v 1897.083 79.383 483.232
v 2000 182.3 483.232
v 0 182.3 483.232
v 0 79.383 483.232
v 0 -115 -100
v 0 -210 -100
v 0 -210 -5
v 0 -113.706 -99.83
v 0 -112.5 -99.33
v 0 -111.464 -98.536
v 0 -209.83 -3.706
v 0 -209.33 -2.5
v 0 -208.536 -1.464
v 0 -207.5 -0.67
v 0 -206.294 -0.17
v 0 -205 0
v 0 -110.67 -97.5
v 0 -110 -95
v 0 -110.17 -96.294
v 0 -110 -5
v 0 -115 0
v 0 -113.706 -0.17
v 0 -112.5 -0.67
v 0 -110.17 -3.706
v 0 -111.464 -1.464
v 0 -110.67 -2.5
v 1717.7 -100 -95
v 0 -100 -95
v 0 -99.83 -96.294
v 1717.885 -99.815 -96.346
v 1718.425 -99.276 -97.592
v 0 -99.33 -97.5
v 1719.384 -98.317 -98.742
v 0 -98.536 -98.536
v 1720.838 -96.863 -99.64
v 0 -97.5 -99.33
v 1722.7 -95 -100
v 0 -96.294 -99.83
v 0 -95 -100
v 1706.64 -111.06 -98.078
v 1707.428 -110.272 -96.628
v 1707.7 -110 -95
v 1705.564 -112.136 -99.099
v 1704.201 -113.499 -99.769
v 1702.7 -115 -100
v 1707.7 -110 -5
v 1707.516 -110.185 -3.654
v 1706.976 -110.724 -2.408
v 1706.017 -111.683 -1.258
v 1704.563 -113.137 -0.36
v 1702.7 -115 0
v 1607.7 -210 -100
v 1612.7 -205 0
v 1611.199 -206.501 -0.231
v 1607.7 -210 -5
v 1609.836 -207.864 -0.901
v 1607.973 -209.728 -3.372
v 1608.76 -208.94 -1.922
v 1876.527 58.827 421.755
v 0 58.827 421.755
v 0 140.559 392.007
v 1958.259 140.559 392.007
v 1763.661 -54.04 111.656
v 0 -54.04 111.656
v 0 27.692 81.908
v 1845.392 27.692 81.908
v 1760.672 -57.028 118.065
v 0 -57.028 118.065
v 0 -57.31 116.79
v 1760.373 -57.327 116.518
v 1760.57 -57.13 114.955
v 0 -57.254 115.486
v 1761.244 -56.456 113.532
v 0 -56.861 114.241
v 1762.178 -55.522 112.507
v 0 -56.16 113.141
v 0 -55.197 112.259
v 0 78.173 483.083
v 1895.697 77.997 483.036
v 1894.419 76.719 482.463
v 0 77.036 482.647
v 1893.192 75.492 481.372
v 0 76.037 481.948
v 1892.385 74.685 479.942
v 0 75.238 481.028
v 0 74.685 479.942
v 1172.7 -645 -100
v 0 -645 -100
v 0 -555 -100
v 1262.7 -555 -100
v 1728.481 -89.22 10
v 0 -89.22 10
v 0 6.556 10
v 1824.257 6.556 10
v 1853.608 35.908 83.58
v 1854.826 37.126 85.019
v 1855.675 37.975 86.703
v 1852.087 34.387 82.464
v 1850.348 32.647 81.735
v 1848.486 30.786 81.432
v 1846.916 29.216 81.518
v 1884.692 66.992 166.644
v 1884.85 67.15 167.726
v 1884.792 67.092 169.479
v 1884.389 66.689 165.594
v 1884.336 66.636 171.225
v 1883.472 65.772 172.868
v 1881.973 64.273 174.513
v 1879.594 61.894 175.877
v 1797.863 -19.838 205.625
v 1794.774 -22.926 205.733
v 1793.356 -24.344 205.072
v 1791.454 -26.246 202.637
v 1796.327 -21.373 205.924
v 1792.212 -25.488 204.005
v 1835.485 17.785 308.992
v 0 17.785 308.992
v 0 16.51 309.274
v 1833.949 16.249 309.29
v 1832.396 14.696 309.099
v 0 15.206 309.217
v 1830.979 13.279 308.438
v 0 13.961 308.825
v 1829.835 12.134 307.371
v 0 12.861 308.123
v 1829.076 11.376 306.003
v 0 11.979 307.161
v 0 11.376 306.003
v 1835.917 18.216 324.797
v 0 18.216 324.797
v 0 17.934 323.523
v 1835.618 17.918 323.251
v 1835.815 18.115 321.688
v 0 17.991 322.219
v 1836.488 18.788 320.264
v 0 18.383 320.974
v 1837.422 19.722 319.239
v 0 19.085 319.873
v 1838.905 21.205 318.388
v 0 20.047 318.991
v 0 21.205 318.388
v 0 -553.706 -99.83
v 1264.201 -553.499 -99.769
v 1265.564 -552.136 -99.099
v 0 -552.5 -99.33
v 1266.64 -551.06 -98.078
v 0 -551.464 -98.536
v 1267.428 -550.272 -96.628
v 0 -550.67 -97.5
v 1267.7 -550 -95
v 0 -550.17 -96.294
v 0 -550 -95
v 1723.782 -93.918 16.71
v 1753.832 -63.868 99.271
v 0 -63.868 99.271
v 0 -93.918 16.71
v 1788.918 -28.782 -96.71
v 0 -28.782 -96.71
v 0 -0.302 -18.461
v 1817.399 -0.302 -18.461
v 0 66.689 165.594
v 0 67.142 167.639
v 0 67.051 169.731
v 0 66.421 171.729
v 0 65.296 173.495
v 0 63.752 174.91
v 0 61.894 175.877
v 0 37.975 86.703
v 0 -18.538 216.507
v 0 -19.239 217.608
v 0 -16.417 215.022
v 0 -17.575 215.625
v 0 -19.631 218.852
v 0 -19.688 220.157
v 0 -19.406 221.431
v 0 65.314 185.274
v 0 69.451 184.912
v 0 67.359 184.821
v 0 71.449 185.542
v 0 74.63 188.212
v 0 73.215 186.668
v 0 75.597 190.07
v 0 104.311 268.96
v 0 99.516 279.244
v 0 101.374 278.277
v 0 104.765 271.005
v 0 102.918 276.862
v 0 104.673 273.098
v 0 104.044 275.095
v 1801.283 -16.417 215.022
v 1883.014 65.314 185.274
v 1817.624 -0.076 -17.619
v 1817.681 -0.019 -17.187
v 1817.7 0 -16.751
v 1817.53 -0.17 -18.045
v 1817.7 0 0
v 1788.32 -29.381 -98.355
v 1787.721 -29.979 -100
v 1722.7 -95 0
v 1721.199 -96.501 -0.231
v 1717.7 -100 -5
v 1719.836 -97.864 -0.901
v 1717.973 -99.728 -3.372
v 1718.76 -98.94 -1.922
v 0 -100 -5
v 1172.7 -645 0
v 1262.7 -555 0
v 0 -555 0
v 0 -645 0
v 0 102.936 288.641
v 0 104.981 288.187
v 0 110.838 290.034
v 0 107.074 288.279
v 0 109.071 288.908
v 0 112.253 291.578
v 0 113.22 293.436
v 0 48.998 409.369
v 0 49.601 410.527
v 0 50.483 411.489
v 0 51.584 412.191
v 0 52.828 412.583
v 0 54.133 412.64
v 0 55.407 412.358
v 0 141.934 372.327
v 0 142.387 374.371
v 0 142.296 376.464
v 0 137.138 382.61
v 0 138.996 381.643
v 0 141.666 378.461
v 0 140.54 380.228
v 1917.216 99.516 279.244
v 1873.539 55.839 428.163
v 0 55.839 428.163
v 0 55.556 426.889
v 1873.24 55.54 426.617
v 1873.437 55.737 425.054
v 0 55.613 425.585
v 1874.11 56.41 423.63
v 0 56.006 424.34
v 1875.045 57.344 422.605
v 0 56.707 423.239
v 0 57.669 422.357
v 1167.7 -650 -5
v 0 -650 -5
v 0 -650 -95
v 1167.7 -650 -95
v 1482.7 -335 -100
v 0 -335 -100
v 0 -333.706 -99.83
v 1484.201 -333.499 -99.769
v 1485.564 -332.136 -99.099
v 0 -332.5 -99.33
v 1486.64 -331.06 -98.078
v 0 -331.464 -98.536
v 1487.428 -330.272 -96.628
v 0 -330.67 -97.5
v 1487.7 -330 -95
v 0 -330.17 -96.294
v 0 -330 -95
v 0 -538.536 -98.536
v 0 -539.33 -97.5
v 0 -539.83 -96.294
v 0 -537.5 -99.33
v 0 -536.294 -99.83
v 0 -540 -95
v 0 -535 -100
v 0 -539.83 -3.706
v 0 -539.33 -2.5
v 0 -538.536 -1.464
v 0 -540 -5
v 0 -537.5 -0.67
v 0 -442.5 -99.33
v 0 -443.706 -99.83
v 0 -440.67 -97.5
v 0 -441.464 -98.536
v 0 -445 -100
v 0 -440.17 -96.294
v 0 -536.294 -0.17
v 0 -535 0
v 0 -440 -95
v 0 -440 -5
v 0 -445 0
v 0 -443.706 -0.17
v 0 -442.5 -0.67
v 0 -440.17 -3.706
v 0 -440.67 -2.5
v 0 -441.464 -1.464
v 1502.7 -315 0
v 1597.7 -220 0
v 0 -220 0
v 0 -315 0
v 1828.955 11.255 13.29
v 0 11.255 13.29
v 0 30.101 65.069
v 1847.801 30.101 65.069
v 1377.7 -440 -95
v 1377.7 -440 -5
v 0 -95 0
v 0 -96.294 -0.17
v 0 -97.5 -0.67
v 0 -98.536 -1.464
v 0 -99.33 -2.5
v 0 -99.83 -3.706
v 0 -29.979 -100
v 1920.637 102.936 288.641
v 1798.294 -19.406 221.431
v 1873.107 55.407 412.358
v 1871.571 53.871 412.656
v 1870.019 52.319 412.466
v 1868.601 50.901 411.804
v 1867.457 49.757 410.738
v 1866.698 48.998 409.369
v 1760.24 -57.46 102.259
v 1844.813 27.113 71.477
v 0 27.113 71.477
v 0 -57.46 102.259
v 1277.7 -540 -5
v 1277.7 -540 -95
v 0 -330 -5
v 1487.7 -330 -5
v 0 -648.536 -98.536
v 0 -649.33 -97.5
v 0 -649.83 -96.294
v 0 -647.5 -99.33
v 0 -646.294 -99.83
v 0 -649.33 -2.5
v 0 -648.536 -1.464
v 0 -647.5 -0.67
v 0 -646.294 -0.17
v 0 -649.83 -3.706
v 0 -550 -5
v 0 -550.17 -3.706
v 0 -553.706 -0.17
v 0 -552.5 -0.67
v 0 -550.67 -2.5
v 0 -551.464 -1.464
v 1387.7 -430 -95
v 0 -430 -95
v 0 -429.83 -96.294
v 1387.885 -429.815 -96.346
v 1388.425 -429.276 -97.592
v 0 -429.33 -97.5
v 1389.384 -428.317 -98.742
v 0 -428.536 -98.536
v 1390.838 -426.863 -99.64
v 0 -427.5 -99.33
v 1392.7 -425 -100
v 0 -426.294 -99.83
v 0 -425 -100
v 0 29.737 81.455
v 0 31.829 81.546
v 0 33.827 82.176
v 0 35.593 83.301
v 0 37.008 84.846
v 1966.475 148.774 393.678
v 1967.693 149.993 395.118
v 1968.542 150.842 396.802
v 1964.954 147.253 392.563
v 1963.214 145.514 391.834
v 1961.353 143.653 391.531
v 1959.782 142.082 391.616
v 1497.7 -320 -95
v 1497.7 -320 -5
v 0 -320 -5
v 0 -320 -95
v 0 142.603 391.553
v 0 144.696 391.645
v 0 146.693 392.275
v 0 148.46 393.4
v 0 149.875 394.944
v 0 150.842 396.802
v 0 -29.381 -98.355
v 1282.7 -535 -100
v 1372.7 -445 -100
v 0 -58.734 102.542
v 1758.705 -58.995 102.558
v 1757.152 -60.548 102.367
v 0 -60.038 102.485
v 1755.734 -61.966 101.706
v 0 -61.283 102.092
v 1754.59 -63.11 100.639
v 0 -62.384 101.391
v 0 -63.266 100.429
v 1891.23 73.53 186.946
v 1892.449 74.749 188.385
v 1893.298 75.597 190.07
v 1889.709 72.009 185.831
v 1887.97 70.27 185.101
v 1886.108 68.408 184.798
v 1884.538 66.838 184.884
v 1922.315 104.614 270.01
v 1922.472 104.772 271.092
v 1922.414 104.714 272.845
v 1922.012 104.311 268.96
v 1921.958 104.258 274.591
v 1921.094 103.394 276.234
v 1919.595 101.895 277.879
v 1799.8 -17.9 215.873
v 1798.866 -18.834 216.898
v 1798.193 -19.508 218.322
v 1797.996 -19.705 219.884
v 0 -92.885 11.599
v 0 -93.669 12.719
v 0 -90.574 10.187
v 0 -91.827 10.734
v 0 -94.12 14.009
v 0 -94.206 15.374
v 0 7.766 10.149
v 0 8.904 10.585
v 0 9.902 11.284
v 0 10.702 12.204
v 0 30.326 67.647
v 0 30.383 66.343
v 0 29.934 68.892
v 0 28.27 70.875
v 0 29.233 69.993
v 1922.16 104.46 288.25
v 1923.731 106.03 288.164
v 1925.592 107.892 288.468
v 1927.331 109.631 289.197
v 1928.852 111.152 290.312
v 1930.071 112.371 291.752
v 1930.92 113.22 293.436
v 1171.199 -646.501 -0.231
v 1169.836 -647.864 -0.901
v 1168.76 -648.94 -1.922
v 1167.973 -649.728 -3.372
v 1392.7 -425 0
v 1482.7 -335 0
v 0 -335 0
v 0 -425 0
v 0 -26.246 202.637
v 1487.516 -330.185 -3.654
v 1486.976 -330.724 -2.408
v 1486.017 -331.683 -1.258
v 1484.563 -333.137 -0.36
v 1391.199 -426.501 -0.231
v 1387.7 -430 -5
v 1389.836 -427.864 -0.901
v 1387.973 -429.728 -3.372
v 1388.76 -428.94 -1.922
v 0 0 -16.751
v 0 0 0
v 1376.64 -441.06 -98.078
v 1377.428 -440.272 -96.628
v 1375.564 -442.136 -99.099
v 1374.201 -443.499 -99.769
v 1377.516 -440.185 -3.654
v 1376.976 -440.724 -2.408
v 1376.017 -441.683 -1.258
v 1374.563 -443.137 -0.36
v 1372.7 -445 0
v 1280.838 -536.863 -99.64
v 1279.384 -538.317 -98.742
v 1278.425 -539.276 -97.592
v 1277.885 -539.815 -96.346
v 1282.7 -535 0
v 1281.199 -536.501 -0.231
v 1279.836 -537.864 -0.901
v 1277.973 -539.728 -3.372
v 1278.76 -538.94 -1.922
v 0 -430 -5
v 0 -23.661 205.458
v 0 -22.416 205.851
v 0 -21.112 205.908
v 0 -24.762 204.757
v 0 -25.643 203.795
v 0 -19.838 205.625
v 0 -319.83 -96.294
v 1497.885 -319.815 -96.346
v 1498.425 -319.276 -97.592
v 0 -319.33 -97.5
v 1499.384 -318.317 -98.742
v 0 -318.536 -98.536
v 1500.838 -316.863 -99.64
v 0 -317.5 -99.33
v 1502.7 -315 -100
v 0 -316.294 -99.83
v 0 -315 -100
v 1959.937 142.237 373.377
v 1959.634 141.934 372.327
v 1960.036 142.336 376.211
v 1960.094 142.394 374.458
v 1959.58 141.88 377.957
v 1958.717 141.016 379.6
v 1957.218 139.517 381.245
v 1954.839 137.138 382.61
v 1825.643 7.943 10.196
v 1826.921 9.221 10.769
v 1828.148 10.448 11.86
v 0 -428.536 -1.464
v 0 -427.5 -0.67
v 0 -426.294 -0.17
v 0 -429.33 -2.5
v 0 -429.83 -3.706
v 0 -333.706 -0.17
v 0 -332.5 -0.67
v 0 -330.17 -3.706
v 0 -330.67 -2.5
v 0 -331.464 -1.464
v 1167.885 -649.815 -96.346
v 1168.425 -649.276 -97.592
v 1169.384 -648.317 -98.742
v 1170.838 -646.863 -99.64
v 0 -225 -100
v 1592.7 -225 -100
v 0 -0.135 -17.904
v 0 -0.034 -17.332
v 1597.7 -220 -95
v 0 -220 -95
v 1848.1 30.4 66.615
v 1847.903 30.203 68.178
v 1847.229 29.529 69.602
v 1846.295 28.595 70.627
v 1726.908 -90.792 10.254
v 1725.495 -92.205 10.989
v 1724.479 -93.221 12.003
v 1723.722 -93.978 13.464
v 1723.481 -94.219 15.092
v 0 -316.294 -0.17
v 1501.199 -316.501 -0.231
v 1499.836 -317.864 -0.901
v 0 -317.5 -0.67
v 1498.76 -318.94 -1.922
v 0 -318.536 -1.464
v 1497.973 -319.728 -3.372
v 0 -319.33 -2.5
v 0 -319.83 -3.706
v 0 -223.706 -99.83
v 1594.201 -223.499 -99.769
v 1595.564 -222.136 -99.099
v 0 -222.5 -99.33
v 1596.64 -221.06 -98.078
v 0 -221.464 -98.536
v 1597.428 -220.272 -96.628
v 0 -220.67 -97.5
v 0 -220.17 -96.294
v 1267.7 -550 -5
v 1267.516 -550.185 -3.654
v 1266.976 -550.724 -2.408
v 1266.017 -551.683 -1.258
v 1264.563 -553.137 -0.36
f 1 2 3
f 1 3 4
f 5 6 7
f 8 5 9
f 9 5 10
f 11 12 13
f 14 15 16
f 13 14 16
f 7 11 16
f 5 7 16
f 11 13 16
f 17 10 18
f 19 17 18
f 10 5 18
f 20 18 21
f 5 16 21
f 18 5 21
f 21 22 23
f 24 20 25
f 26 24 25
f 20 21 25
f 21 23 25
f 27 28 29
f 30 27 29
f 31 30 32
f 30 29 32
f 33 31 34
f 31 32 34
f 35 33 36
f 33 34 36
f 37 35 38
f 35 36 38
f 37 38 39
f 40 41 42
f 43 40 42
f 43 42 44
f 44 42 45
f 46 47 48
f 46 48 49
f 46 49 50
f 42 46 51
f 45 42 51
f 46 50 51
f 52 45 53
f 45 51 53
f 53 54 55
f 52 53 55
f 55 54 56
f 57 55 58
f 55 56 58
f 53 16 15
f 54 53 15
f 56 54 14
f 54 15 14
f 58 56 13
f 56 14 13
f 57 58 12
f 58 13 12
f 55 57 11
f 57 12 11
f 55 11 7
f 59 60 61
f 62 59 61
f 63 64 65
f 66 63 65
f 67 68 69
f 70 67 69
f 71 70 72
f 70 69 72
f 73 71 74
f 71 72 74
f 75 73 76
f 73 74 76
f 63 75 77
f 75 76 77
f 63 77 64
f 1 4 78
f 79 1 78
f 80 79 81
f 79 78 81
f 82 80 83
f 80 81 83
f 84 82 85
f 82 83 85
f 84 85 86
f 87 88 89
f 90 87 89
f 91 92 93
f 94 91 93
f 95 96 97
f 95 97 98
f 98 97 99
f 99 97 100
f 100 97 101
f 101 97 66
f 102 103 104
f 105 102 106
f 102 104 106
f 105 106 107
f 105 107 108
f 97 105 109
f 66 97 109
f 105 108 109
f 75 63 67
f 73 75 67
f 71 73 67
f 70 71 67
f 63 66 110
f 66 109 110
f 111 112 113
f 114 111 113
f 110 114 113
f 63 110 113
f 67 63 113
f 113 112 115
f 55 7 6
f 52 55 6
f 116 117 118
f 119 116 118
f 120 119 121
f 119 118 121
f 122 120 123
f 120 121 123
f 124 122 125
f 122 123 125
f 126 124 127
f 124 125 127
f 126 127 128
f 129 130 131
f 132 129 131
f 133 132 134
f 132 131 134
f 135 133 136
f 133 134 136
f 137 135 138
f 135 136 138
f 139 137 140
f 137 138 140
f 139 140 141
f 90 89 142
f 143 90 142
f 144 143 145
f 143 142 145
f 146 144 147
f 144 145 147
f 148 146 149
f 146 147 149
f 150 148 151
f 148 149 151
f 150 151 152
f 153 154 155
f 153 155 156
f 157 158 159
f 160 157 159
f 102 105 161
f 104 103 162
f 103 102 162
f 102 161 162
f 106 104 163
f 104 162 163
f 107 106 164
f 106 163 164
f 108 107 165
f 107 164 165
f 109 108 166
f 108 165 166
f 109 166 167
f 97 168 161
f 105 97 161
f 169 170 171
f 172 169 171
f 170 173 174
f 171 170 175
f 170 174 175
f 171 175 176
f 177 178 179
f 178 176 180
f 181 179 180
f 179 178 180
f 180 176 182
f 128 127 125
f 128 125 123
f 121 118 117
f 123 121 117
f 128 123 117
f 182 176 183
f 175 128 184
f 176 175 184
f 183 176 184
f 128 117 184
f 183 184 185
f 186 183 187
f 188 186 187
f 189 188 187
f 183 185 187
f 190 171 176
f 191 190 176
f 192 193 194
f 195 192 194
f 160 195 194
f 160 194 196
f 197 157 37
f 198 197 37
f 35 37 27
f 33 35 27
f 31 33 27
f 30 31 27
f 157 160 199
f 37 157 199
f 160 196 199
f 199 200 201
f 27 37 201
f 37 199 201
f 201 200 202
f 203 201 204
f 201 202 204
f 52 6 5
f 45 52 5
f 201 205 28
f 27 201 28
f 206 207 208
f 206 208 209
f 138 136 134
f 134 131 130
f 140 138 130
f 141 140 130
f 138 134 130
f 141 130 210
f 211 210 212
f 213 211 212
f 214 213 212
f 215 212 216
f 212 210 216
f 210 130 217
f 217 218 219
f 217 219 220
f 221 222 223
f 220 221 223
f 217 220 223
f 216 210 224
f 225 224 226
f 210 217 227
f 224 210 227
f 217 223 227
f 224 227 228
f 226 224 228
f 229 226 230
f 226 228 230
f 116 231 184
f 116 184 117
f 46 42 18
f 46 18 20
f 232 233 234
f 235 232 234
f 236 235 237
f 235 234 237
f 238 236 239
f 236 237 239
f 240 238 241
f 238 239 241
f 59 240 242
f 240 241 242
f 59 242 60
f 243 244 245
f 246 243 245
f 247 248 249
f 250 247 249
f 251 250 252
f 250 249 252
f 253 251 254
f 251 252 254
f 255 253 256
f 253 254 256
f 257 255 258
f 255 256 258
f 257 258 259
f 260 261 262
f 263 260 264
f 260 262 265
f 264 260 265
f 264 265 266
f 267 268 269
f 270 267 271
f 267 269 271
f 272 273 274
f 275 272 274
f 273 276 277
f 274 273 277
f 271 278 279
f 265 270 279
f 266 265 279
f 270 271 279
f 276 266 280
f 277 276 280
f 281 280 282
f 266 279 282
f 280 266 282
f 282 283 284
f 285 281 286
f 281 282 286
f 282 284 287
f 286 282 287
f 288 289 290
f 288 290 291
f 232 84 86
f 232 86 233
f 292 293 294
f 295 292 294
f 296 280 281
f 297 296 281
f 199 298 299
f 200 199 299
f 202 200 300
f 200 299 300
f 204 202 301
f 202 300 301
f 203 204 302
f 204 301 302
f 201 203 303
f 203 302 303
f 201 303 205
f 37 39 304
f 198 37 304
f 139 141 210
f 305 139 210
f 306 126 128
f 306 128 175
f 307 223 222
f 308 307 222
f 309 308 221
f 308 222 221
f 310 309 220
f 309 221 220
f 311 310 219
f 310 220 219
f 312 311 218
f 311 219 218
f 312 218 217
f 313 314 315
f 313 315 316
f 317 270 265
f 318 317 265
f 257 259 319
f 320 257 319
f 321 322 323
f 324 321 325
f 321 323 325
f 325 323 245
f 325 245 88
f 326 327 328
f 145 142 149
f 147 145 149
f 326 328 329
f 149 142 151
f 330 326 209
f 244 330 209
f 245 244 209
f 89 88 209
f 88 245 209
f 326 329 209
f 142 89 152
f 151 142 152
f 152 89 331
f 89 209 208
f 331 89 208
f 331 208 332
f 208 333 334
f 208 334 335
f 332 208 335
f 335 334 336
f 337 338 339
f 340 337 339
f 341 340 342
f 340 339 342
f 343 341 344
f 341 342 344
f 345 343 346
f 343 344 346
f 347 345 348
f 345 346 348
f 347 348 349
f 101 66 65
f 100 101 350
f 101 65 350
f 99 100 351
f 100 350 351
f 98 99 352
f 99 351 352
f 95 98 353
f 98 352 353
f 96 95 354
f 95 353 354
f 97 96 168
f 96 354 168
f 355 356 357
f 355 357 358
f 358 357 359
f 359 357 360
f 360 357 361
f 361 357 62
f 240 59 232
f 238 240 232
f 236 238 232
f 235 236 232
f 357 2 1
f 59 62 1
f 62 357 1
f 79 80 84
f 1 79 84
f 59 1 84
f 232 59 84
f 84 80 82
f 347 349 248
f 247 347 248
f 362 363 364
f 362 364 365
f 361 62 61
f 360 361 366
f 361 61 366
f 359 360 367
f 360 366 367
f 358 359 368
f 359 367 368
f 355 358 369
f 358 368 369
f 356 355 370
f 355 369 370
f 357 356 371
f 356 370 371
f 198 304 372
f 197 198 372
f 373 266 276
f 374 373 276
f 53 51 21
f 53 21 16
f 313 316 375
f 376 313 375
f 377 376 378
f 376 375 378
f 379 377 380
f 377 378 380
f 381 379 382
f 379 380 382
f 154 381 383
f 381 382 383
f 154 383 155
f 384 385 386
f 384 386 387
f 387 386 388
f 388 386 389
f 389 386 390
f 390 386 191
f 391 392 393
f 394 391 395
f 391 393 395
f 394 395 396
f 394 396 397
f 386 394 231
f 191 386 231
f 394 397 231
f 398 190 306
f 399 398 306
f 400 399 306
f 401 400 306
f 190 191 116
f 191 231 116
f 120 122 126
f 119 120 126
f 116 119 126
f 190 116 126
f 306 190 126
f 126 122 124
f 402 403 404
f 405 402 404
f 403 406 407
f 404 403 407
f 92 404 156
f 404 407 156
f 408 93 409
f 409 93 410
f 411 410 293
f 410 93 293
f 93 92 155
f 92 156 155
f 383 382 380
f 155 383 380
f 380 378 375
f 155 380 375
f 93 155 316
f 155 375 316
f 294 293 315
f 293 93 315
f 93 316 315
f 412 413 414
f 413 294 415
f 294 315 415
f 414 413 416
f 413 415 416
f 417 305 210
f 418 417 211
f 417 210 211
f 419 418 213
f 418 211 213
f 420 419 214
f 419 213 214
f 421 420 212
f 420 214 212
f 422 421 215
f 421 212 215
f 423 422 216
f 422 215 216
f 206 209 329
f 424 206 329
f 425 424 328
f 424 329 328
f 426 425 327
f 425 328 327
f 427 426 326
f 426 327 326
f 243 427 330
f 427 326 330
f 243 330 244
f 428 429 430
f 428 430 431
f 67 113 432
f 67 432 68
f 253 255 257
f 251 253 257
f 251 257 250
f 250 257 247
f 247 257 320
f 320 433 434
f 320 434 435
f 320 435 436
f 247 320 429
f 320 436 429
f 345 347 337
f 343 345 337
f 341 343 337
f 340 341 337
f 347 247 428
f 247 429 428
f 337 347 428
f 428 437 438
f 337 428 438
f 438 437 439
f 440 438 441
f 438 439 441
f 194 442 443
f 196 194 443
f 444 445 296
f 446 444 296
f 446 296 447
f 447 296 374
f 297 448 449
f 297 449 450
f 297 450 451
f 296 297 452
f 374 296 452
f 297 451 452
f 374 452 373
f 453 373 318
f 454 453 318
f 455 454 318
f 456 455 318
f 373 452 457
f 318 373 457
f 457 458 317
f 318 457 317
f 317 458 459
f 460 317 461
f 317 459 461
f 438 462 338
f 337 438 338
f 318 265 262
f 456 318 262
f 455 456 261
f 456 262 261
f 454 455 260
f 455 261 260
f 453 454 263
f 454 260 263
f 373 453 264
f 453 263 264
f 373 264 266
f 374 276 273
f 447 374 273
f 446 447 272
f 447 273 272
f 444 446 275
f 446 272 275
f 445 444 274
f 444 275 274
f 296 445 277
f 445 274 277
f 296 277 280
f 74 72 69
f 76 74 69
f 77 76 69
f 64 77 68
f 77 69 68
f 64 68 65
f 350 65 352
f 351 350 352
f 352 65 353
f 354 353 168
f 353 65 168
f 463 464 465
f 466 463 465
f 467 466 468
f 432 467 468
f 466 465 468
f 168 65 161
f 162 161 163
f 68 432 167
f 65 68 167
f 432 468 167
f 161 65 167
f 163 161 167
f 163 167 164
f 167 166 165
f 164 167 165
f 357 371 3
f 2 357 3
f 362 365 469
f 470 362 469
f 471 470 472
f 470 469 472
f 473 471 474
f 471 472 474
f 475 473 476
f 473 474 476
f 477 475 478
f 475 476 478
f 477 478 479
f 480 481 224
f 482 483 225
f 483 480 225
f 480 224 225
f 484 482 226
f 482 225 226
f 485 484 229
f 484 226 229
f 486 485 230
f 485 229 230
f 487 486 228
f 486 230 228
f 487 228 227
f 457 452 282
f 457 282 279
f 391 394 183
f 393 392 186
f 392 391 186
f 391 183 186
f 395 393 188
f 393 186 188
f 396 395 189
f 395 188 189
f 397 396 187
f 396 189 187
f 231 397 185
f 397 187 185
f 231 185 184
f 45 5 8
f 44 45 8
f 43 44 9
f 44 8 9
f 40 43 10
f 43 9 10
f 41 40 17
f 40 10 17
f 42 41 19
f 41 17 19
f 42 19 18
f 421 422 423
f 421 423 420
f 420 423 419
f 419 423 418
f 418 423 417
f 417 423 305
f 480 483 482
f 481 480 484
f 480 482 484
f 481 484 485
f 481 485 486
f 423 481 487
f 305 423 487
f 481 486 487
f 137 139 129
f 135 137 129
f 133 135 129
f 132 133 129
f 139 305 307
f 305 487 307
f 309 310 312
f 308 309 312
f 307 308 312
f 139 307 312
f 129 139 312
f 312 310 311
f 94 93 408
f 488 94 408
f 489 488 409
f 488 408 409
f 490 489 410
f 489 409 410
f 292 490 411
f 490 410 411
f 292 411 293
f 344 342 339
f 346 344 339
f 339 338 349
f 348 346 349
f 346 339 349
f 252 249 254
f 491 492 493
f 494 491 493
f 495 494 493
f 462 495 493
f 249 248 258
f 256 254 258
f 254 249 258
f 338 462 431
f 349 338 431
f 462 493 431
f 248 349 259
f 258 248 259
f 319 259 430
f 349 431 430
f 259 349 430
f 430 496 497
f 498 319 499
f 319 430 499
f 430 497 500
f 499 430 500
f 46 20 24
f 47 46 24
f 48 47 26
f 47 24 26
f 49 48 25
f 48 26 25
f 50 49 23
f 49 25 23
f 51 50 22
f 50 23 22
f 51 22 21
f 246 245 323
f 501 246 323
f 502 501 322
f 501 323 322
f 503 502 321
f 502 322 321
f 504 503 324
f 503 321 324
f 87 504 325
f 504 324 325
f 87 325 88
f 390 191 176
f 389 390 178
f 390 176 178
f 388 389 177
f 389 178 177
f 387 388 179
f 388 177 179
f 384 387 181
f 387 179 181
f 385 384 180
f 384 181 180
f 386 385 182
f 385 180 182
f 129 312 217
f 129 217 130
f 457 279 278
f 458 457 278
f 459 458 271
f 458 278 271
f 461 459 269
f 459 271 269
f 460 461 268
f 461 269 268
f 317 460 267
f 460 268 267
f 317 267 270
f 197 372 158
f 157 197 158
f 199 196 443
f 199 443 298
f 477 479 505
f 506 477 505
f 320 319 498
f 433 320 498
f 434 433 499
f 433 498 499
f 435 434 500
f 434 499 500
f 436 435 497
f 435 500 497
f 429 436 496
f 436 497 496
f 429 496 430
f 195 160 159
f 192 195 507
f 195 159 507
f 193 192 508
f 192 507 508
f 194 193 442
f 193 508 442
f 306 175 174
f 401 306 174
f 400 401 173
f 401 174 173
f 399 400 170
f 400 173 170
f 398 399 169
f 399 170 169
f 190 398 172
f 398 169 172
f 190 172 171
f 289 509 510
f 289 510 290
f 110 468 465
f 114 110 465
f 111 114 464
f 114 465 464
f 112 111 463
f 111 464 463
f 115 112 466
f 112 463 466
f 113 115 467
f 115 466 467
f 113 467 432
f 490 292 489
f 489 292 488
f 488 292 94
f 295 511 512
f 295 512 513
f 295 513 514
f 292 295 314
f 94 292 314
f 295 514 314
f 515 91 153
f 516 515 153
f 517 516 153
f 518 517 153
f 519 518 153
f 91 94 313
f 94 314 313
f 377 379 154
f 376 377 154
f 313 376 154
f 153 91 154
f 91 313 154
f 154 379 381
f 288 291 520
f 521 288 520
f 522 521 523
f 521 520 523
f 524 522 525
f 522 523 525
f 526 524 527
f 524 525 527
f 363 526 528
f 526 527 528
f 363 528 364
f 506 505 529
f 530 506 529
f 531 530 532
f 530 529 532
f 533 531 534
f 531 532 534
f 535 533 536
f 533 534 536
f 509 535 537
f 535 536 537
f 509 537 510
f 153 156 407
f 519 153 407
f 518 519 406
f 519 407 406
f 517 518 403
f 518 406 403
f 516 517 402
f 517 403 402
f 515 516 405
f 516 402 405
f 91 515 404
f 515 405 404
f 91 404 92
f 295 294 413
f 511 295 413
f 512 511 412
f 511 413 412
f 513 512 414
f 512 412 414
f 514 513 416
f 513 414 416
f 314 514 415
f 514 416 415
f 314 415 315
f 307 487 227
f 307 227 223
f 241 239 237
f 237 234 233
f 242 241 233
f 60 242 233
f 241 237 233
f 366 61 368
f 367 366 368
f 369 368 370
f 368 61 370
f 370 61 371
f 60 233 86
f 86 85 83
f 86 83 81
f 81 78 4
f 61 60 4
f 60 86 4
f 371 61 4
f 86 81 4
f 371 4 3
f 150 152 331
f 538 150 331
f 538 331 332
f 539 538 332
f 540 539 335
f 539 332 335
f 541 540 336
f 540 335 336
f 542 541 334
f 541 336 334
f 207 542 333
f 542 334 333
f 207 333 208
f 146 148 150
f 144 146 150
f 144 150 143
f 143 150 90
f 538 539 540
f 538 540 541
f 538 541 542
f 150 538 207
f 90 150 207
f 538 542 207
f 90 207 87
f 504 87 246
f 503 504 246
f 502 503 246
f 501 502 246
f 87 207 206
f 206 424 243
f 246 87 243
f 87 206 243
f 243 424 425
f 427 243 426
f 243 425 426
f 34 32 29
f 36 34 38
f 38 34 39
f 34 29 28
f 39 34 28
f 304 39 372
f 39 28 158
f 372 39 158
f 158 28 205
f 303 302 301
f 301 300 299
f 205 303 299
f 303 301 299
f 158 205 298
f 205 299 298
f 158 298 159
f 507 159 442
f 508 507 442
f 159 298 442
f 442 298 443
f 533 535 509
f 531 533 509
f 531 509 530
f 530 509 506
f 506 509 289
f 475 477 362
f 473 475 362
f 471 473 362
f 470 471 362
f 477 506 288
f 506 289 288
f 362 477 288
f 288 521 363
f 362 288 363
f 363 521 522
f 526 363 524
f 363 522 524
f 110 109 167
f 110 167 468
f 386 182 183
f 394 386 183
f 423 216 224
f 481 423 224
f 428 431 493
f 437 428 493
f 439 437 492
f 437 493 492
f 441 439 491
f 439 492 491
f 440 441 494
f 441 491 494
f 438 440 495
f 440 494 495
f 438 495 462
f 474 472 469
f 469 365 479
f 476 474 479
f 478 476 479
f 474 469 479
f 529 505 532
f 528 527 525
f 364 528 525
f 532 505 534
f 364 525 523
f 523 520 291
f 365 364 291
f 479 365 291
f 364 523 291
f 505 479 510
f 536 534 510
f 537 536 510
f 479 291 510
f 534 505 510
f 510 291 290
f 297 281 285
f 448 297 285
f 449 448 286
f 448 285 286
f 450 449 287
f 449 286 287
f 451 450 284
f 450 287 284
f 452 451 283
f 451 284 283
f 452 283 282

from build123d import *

# Parameters (mm, degrees)
F1_DEPTH = 2000
F3_DEPTH = 583.2330008918


with BuildPart() as f1:
    # F0 (on Right) → F1 (new body)
    with BuildSketch(Plane.YZ):
        with BuildLine():
            Line((0, -16.7510631673), (0, 0))
            Line((0, 0), (-95, 0))
            ThreePointArc((-95, 0), (-98.5355339059, -1.4644660941), (-100, -5))
            Line((-100, -5), (-100, -95))
            ThreePointArc((-100, -95), (-98.5355339059, -98.5355339059), (-95, -100))
            Line((-95, -100), (-33.4802838701, -100))
            Line((-33.4802838701, -100), (-29.979246179, -100))
            Line((-29.979246179, -100), (-29.3805334726, -98.3550503583))
            Line((-29.3805334726, -98.3550503583), (-28.7818207661, -96.7101007166))
            Line((-28.7818207661, -96.7101007166), (-0.3015368961, -18.4611638839))
            ThreePointArc((-0.3015368961, -18.4611638839), (-0.0759612349, -17.6193040556), (0, -16.7510631673))
        make_face()
    extrude(amount=F1_DEPTH)


with BuildPart() as f1b:
    # F0 (on Right) → F1, piece 2 (new body)
    with BuildSketch(Plane.YZ):
        with BuildLine():
            ThreePointArc((-110, -5), (-111.4644660941, -1.4644660941), (-115, 0))
            Line((-115, 0), (-205, 0))
            ThreePointArc((-205, 0), (-208.5355339059, -1.4644660941), (-210, -5))
            Line((-210, -5), (-210, -100))
            Line((-210, -100), (-115, -100))
            ThreePointArc((-115, -100), (-111.4644660941, -98.5355339059), (-110, -95))
            Line((-110, -95), (-110, -5))
        make_face()
    extrude(amount=F1_DEPTH)


with BuildPart() as f1c:
    # F0 (on Right) → F1, piece 3 (new body)
    with BuildSketch(Plane.YZ):
        with BuildLine():
            Line((-220, -95), (-220, 0))
            Line((-220, 0), (-315, 0))
            ThreePointArc((-315, 0), (-318.5355339059, -1.4644660941), (-320, -5))
            Line((-320, -5), (-320, -95))
            ThreePointArc((-320, -95), (-318.5355339059, -98.5355339059), (-315, -100))
            Line((-315, -100), (-225, -100))
            ThreePointArc((-225, -100), (-221.4644660941, -98.5355339059), (-220, -95))
        make_face()
    extrude(amount=F1_DEPTH)


with BuildPart() as f1d:
    # F0 (on Right) → F1, piece 4 (new body)
    with BuildSketch(Plane.YZ):
        with BuildLine():
            ThreePointArc((-330, -5), (-331.4644660941, -1.4644660941), (-335, 0))
            Line((-335, 0), (-425, 0))
            ThreePointArc((-425, 0), (-428.5355339059, -1.4644660941), (-430, -5))
            Line((-430, -5), (-430, -95))
            ThreePointArc((-430, -95), (-428.5355339059, -98.5355339059), (-425, -100))
            Line((-425, -100), (-335, -100))
            ThreePointArc((-335, -100), (-331.4644660941, -98.5355339059), (-330, -95))
            Line((-330, -95), (-330, -5))
        make_face()
    extrude(amount=F1_DEPTH)


with BuildPart() as f1e:
    # F0 (on Right) → F1, piece 5 (new body)
    with BuildSketch(Plane.YZ):
        with BuildLine():
            ThreePointArc((-440, -5), (-441.4644660941, -1.4644660941), (-445, 0))
            Line((-445, 0), (-535, 0))
            ThreePointArc((-535, 0), (-538.5355339059, -1.4644660941), (-540, -5))
            Line((-540, -5), (-540, -95))
            ThreePointArc((-540, -95), (-538.5355339059, -98.5355339059), (-535, -100))
            Line((-535, -100), (-445, -100))
            ThreePointArc((-445, -100), (-441.4644660941, -98.5355339059), (-440, -95))
            Line((-440, -95), (-440, -5))
        make_face()
    extrude(amount=F1_DEPTH)


with BuildPart() as f1f:
    # F0 (on Right) → F1, piece 6 (new body)
    with BuildSketch(Plane.YZ):
        with BuildLine():
            ThreePointArc((-550, -5), (-551.4644660941, -1.4644660941), (-555, 0))
            Line((-555, 0), (-645, 0))
            ThreePointArc((-645, 0), (-648.5355339059, -1.4644660941), (-650, -5))
            Line((-650, -5), (-650, -95))
            ThreePointArc((-650, -95), (-648.5355339059, -98.5355339059), (-645, -100))
            Line((-645, -100), (-555, -100))
            ThreePointArc((-555, -100), (-551.4644660941, -98.5355339059), (-550, -95))
            Line((-550, -95), (-550, -5))
        make_face()
    extrude(amount=F1_DEPTH)


with BuildPart() as f1g:
    # F0 (on Right) → F1, piece 7 (new body)
    with BuildSketch(Plane.YZ):
        with BuildLine():
            Line((-63.8683840414, 99.2707989747), (-93.9180207276, 16.7101007166))
            ThreePointArc((-93.9180207276, 16.7101007166), (-93.3153178451, 12.1321178182), (-89.2195576236, 10))
            Line((-89.2195576236, 10), (6.5564418992, 10))
            ThreePointArc((6.5564418992, 10), (9.424324081, 10.9042397786), (11.2549050031, 13.2898992834))
            Line((11.2549050031, 13.2898992834), (30.1008780372, 65.0687846421))
            ThreePointArc((30.1008780372, 65.0687846421), (29.9339538684, 68.8919766674), (27.1125156499, 71.4773484627))
            Line((27.1125156499, 71.4773484627), (-57.4598202208, 102.259161362))
            ThreePointArc((-57.4598202208, 102.259161362), (-61.2830122462, 102.0922371932), (-63.8683840414, 99.2707989747))
        make_face()
    extrude(amount=F1_DEPTH)


with BuildPart() as f1h:
    # F0 (on Right) → F1, piece 8 (new body)
    with BuildSketch(Plane.YZ):
        with BuildLine():
            ThreePointArc((-57.0279811749, 118.0646513904), (-56.8610570061, 114.241459365), (-54.0396187876, 111.6560875698))
            Line((-54.0396187876, 111.6560875698), (27.6920079995, 81.9082082212))
            ThreePointArc((27.6920079995, 81.9082082212), (33.8267168069, 82.1760553922), (37.9752144544, 86.7033461415))
            Line((37.9752144544, 86.7033461415), (66.6891602523, 165.5942638449))
            ThreePointArc((66.6891602523, 165.5942638449), (66.4213130813, 171.7289726523), (61.894022332, 175.8774702998))
            Line((61.894022332, 175.8774702998), (-19.837604455, 205.6253496484))
            ThreePointArc((-19.837604455, 205.6253496484), (-23.6607964803, 205.4584254797), (-26.2461682756, 202.6369872611))
            Line((-26.2461682756, 202.6369872611), (-57.0279811749, 118.0646513904))
        make_face()
    extrude(amount=F1_DEPTH)


with BuildPart() as f1i:
    # F0 (on Right) → F1, piece 9 (new body)
    with BuildSketch(Plane.YZ):
        with BuildLine():
            Line((11.3760474902, 306.0031755476), (-19.4057654091, 221.4308396768))
            ThreePointArc((-19.4057654091, 221.4308396768), (-19.2388412403, 217.6076476515), (-16.4174030218, 215.0222758563))
            Line((-16.4174030218, 215.0222758563), (65.3142237653, 185.2743965076))
            ThreePointArc((65.3142237653, 185.2743965076), (71.4489325728, 185.5422436786), (75.5974302202, 190.0695344279))
            Line((75.5974302202, 190.0695344279), (104.3113760182, 268.9604521313))
            ThreePointArc((104.3113760182, 268.9604521313), (104.0435288472, 275.0951609388), (99.5162380979, 279.2436585862))
            Line((99.5162380979, 279.2436585862), (17.7846113108, 308.9915379349))
            ThreePointArc((17.7846113108, 308.9915379349), (13.9614192855, 308.8246137661), (11.3760474902, 306.0031755476))
        make_face()
    extrude(amount=F1_DEPTH)


with BuildPart() as f1j:
    # F0 (on Right) → F1, piece 10 (new body)
    with BuildSketch(Plane.YZ):
        with BuildLine():
            Line((150.8418617518, 396.8019110008), (182.2998418171, 483.2320008918))
            Line((182.2998418171, 483.2320008918), (79.3831022606, 483.2320008918))
            ThreePointArc((79.3831022606, 483.2320008918), (76.5152200788, 482.3277611133), (74.6846391566, 479.9421016085))
            Line((74.6846391566, 479.9421016085), (55.8386661226, 428.1632162497))
            ThreePointArc((55.8386661226, 428.1632162497), (56.0055902913, 424.3400242244), (58.8270285099, 421.7546524292))
            Line((58.8270285099, 421.7546524292), (140.5586552969, 392.0067730805))
            ThreePointArc((140.5586552969, 392.0067730805), (146.6933641044, 392.2746202515), (150.8418617518, 396.8019110008))
        make_face()
    extrude(amount=F1_DEPTH)


with BuildPart() as f1k:
    # F0 (on Right) → F1, piece 11 (new body)
    with BuildSketch(Plane.YZ):
        with BuildLine():
            ThreePointArc((18.2164503568, 324.7970279633), (18.3833745255, 320.9738359379), (21.2048127441, 318.3884641427))
            Line((21.2048127441, 318.3884641427), (102.9364395311, 288.6405847941))
            ThreePointArc((102.9364395311, 288.6405847941), (109.0711483386, 288.9084319651), (113.219645986, 293.4357227144))
            Line((113.219645986, 293.4357227144), (141.933591784, 372.3266404178))
            ThreePointArc((141.933591784, 372.3266404178), (141.665744613, 378.4613492252), (137.1384538637, 382.6098468727))
            Line((137.1384538637, 382.6098468727), (55.4068270766, 412.3577262213))
            ThreePointArc((55.4068270766, 412.3577262213), (51.5836350513, 412.1908020526), (48.9982632561, 409.369363834))
            Line((48.9982632561, 409.369363834), (18.2164503568, 324.7970279633))
        make_face()
    extrude(amount=F1_DEPTH)


with BuildPart() as f3_tool:
    # F2 (on face) → F3 (new body, through all)
    with BuildSketch(Plane.XY.offset(483.2320008918)):
        Polygon((2000, 79.3831022606), (2000, 182.2998418171), (1897.0832604435, 79.3831022606), align=None)
        Polygon((2000, -650.1975481829), (2000, 79.3831022606), (1897.0832604435, 79.3831022606), (1167.50261, -650.1975481829), align=None)
    extrude(amount=-F3_DEPTH)


with BuildPart() as f1_1:
    add(f1.part)

    # F3: cut by f3_tool
    add(f3_tool.part, mode=Mode.SUBTRACT)


with BuildPart() as f1b_1:
    add(f1b.part)

    # F3: cut by f3_tool
    add(f3_tool.part, mode=Mode.SUBTRACT)


with BuildPart() as f1c_1:
    add(f1c.part)

    # F3: cut by f3_tool
    add(f3_tool.part, mode=Mode.SUBTRACT)


with BuildPart() as f1d_1:
    add(f1d.part)

    # F3: cut by f3_tool
    add(f3_tool.part, mode=Mode.SUBTRACT)


with BuildPart() as f1e_1:
    add(f1e.part)

    # F3: cut by f3_tool
    add(f3_tool.part, mode=Mode.SUBTRACT)


with BuildPart() as f1f_1:
    add(f1f.part)

    # F3: cut by f3_tool
    add(f3_tool.part, mode=Mode.SUBTRACT)


with BuildPart() as f1g_1:
    add(f1g.part)

    # F3: cut by f3_tool
    add(f3_tool.part, mode=Mode.SUBTRACT)


with BuildPart() as f1h_1:
    add(f1h.part)

    # F3: cut by f3_tool
    add(f3_tool.part, mode=Mode.SUBTRACT)


with BuildPart() as f1i_1:
    add(f1i.part)

    # F3: cut by f3_tool
    add(f3_tool.part, mode=Mode.SUBTRACT)


with BuildPart() as f1j_1:
    add(f1j.part)

    # F3: cut by f3_tool
    add(f3_tool.part, mode=Mode.SUBTRACT)


with BuildPart() as f1k_1:
    add(f1k.part)

    # F3: cut by f3_tool
    add(f3_tool.part, mode=Mode.SUBTRACT)


solid = Compound([f1_1.part, f1b_1.part, f1c_1.part, f1d_1.part, f1e_1.part, f1f_1.part, f1g_1.part, f1h_1.part, f1i_1.part, f1j_1.part, f1k_1.part])
